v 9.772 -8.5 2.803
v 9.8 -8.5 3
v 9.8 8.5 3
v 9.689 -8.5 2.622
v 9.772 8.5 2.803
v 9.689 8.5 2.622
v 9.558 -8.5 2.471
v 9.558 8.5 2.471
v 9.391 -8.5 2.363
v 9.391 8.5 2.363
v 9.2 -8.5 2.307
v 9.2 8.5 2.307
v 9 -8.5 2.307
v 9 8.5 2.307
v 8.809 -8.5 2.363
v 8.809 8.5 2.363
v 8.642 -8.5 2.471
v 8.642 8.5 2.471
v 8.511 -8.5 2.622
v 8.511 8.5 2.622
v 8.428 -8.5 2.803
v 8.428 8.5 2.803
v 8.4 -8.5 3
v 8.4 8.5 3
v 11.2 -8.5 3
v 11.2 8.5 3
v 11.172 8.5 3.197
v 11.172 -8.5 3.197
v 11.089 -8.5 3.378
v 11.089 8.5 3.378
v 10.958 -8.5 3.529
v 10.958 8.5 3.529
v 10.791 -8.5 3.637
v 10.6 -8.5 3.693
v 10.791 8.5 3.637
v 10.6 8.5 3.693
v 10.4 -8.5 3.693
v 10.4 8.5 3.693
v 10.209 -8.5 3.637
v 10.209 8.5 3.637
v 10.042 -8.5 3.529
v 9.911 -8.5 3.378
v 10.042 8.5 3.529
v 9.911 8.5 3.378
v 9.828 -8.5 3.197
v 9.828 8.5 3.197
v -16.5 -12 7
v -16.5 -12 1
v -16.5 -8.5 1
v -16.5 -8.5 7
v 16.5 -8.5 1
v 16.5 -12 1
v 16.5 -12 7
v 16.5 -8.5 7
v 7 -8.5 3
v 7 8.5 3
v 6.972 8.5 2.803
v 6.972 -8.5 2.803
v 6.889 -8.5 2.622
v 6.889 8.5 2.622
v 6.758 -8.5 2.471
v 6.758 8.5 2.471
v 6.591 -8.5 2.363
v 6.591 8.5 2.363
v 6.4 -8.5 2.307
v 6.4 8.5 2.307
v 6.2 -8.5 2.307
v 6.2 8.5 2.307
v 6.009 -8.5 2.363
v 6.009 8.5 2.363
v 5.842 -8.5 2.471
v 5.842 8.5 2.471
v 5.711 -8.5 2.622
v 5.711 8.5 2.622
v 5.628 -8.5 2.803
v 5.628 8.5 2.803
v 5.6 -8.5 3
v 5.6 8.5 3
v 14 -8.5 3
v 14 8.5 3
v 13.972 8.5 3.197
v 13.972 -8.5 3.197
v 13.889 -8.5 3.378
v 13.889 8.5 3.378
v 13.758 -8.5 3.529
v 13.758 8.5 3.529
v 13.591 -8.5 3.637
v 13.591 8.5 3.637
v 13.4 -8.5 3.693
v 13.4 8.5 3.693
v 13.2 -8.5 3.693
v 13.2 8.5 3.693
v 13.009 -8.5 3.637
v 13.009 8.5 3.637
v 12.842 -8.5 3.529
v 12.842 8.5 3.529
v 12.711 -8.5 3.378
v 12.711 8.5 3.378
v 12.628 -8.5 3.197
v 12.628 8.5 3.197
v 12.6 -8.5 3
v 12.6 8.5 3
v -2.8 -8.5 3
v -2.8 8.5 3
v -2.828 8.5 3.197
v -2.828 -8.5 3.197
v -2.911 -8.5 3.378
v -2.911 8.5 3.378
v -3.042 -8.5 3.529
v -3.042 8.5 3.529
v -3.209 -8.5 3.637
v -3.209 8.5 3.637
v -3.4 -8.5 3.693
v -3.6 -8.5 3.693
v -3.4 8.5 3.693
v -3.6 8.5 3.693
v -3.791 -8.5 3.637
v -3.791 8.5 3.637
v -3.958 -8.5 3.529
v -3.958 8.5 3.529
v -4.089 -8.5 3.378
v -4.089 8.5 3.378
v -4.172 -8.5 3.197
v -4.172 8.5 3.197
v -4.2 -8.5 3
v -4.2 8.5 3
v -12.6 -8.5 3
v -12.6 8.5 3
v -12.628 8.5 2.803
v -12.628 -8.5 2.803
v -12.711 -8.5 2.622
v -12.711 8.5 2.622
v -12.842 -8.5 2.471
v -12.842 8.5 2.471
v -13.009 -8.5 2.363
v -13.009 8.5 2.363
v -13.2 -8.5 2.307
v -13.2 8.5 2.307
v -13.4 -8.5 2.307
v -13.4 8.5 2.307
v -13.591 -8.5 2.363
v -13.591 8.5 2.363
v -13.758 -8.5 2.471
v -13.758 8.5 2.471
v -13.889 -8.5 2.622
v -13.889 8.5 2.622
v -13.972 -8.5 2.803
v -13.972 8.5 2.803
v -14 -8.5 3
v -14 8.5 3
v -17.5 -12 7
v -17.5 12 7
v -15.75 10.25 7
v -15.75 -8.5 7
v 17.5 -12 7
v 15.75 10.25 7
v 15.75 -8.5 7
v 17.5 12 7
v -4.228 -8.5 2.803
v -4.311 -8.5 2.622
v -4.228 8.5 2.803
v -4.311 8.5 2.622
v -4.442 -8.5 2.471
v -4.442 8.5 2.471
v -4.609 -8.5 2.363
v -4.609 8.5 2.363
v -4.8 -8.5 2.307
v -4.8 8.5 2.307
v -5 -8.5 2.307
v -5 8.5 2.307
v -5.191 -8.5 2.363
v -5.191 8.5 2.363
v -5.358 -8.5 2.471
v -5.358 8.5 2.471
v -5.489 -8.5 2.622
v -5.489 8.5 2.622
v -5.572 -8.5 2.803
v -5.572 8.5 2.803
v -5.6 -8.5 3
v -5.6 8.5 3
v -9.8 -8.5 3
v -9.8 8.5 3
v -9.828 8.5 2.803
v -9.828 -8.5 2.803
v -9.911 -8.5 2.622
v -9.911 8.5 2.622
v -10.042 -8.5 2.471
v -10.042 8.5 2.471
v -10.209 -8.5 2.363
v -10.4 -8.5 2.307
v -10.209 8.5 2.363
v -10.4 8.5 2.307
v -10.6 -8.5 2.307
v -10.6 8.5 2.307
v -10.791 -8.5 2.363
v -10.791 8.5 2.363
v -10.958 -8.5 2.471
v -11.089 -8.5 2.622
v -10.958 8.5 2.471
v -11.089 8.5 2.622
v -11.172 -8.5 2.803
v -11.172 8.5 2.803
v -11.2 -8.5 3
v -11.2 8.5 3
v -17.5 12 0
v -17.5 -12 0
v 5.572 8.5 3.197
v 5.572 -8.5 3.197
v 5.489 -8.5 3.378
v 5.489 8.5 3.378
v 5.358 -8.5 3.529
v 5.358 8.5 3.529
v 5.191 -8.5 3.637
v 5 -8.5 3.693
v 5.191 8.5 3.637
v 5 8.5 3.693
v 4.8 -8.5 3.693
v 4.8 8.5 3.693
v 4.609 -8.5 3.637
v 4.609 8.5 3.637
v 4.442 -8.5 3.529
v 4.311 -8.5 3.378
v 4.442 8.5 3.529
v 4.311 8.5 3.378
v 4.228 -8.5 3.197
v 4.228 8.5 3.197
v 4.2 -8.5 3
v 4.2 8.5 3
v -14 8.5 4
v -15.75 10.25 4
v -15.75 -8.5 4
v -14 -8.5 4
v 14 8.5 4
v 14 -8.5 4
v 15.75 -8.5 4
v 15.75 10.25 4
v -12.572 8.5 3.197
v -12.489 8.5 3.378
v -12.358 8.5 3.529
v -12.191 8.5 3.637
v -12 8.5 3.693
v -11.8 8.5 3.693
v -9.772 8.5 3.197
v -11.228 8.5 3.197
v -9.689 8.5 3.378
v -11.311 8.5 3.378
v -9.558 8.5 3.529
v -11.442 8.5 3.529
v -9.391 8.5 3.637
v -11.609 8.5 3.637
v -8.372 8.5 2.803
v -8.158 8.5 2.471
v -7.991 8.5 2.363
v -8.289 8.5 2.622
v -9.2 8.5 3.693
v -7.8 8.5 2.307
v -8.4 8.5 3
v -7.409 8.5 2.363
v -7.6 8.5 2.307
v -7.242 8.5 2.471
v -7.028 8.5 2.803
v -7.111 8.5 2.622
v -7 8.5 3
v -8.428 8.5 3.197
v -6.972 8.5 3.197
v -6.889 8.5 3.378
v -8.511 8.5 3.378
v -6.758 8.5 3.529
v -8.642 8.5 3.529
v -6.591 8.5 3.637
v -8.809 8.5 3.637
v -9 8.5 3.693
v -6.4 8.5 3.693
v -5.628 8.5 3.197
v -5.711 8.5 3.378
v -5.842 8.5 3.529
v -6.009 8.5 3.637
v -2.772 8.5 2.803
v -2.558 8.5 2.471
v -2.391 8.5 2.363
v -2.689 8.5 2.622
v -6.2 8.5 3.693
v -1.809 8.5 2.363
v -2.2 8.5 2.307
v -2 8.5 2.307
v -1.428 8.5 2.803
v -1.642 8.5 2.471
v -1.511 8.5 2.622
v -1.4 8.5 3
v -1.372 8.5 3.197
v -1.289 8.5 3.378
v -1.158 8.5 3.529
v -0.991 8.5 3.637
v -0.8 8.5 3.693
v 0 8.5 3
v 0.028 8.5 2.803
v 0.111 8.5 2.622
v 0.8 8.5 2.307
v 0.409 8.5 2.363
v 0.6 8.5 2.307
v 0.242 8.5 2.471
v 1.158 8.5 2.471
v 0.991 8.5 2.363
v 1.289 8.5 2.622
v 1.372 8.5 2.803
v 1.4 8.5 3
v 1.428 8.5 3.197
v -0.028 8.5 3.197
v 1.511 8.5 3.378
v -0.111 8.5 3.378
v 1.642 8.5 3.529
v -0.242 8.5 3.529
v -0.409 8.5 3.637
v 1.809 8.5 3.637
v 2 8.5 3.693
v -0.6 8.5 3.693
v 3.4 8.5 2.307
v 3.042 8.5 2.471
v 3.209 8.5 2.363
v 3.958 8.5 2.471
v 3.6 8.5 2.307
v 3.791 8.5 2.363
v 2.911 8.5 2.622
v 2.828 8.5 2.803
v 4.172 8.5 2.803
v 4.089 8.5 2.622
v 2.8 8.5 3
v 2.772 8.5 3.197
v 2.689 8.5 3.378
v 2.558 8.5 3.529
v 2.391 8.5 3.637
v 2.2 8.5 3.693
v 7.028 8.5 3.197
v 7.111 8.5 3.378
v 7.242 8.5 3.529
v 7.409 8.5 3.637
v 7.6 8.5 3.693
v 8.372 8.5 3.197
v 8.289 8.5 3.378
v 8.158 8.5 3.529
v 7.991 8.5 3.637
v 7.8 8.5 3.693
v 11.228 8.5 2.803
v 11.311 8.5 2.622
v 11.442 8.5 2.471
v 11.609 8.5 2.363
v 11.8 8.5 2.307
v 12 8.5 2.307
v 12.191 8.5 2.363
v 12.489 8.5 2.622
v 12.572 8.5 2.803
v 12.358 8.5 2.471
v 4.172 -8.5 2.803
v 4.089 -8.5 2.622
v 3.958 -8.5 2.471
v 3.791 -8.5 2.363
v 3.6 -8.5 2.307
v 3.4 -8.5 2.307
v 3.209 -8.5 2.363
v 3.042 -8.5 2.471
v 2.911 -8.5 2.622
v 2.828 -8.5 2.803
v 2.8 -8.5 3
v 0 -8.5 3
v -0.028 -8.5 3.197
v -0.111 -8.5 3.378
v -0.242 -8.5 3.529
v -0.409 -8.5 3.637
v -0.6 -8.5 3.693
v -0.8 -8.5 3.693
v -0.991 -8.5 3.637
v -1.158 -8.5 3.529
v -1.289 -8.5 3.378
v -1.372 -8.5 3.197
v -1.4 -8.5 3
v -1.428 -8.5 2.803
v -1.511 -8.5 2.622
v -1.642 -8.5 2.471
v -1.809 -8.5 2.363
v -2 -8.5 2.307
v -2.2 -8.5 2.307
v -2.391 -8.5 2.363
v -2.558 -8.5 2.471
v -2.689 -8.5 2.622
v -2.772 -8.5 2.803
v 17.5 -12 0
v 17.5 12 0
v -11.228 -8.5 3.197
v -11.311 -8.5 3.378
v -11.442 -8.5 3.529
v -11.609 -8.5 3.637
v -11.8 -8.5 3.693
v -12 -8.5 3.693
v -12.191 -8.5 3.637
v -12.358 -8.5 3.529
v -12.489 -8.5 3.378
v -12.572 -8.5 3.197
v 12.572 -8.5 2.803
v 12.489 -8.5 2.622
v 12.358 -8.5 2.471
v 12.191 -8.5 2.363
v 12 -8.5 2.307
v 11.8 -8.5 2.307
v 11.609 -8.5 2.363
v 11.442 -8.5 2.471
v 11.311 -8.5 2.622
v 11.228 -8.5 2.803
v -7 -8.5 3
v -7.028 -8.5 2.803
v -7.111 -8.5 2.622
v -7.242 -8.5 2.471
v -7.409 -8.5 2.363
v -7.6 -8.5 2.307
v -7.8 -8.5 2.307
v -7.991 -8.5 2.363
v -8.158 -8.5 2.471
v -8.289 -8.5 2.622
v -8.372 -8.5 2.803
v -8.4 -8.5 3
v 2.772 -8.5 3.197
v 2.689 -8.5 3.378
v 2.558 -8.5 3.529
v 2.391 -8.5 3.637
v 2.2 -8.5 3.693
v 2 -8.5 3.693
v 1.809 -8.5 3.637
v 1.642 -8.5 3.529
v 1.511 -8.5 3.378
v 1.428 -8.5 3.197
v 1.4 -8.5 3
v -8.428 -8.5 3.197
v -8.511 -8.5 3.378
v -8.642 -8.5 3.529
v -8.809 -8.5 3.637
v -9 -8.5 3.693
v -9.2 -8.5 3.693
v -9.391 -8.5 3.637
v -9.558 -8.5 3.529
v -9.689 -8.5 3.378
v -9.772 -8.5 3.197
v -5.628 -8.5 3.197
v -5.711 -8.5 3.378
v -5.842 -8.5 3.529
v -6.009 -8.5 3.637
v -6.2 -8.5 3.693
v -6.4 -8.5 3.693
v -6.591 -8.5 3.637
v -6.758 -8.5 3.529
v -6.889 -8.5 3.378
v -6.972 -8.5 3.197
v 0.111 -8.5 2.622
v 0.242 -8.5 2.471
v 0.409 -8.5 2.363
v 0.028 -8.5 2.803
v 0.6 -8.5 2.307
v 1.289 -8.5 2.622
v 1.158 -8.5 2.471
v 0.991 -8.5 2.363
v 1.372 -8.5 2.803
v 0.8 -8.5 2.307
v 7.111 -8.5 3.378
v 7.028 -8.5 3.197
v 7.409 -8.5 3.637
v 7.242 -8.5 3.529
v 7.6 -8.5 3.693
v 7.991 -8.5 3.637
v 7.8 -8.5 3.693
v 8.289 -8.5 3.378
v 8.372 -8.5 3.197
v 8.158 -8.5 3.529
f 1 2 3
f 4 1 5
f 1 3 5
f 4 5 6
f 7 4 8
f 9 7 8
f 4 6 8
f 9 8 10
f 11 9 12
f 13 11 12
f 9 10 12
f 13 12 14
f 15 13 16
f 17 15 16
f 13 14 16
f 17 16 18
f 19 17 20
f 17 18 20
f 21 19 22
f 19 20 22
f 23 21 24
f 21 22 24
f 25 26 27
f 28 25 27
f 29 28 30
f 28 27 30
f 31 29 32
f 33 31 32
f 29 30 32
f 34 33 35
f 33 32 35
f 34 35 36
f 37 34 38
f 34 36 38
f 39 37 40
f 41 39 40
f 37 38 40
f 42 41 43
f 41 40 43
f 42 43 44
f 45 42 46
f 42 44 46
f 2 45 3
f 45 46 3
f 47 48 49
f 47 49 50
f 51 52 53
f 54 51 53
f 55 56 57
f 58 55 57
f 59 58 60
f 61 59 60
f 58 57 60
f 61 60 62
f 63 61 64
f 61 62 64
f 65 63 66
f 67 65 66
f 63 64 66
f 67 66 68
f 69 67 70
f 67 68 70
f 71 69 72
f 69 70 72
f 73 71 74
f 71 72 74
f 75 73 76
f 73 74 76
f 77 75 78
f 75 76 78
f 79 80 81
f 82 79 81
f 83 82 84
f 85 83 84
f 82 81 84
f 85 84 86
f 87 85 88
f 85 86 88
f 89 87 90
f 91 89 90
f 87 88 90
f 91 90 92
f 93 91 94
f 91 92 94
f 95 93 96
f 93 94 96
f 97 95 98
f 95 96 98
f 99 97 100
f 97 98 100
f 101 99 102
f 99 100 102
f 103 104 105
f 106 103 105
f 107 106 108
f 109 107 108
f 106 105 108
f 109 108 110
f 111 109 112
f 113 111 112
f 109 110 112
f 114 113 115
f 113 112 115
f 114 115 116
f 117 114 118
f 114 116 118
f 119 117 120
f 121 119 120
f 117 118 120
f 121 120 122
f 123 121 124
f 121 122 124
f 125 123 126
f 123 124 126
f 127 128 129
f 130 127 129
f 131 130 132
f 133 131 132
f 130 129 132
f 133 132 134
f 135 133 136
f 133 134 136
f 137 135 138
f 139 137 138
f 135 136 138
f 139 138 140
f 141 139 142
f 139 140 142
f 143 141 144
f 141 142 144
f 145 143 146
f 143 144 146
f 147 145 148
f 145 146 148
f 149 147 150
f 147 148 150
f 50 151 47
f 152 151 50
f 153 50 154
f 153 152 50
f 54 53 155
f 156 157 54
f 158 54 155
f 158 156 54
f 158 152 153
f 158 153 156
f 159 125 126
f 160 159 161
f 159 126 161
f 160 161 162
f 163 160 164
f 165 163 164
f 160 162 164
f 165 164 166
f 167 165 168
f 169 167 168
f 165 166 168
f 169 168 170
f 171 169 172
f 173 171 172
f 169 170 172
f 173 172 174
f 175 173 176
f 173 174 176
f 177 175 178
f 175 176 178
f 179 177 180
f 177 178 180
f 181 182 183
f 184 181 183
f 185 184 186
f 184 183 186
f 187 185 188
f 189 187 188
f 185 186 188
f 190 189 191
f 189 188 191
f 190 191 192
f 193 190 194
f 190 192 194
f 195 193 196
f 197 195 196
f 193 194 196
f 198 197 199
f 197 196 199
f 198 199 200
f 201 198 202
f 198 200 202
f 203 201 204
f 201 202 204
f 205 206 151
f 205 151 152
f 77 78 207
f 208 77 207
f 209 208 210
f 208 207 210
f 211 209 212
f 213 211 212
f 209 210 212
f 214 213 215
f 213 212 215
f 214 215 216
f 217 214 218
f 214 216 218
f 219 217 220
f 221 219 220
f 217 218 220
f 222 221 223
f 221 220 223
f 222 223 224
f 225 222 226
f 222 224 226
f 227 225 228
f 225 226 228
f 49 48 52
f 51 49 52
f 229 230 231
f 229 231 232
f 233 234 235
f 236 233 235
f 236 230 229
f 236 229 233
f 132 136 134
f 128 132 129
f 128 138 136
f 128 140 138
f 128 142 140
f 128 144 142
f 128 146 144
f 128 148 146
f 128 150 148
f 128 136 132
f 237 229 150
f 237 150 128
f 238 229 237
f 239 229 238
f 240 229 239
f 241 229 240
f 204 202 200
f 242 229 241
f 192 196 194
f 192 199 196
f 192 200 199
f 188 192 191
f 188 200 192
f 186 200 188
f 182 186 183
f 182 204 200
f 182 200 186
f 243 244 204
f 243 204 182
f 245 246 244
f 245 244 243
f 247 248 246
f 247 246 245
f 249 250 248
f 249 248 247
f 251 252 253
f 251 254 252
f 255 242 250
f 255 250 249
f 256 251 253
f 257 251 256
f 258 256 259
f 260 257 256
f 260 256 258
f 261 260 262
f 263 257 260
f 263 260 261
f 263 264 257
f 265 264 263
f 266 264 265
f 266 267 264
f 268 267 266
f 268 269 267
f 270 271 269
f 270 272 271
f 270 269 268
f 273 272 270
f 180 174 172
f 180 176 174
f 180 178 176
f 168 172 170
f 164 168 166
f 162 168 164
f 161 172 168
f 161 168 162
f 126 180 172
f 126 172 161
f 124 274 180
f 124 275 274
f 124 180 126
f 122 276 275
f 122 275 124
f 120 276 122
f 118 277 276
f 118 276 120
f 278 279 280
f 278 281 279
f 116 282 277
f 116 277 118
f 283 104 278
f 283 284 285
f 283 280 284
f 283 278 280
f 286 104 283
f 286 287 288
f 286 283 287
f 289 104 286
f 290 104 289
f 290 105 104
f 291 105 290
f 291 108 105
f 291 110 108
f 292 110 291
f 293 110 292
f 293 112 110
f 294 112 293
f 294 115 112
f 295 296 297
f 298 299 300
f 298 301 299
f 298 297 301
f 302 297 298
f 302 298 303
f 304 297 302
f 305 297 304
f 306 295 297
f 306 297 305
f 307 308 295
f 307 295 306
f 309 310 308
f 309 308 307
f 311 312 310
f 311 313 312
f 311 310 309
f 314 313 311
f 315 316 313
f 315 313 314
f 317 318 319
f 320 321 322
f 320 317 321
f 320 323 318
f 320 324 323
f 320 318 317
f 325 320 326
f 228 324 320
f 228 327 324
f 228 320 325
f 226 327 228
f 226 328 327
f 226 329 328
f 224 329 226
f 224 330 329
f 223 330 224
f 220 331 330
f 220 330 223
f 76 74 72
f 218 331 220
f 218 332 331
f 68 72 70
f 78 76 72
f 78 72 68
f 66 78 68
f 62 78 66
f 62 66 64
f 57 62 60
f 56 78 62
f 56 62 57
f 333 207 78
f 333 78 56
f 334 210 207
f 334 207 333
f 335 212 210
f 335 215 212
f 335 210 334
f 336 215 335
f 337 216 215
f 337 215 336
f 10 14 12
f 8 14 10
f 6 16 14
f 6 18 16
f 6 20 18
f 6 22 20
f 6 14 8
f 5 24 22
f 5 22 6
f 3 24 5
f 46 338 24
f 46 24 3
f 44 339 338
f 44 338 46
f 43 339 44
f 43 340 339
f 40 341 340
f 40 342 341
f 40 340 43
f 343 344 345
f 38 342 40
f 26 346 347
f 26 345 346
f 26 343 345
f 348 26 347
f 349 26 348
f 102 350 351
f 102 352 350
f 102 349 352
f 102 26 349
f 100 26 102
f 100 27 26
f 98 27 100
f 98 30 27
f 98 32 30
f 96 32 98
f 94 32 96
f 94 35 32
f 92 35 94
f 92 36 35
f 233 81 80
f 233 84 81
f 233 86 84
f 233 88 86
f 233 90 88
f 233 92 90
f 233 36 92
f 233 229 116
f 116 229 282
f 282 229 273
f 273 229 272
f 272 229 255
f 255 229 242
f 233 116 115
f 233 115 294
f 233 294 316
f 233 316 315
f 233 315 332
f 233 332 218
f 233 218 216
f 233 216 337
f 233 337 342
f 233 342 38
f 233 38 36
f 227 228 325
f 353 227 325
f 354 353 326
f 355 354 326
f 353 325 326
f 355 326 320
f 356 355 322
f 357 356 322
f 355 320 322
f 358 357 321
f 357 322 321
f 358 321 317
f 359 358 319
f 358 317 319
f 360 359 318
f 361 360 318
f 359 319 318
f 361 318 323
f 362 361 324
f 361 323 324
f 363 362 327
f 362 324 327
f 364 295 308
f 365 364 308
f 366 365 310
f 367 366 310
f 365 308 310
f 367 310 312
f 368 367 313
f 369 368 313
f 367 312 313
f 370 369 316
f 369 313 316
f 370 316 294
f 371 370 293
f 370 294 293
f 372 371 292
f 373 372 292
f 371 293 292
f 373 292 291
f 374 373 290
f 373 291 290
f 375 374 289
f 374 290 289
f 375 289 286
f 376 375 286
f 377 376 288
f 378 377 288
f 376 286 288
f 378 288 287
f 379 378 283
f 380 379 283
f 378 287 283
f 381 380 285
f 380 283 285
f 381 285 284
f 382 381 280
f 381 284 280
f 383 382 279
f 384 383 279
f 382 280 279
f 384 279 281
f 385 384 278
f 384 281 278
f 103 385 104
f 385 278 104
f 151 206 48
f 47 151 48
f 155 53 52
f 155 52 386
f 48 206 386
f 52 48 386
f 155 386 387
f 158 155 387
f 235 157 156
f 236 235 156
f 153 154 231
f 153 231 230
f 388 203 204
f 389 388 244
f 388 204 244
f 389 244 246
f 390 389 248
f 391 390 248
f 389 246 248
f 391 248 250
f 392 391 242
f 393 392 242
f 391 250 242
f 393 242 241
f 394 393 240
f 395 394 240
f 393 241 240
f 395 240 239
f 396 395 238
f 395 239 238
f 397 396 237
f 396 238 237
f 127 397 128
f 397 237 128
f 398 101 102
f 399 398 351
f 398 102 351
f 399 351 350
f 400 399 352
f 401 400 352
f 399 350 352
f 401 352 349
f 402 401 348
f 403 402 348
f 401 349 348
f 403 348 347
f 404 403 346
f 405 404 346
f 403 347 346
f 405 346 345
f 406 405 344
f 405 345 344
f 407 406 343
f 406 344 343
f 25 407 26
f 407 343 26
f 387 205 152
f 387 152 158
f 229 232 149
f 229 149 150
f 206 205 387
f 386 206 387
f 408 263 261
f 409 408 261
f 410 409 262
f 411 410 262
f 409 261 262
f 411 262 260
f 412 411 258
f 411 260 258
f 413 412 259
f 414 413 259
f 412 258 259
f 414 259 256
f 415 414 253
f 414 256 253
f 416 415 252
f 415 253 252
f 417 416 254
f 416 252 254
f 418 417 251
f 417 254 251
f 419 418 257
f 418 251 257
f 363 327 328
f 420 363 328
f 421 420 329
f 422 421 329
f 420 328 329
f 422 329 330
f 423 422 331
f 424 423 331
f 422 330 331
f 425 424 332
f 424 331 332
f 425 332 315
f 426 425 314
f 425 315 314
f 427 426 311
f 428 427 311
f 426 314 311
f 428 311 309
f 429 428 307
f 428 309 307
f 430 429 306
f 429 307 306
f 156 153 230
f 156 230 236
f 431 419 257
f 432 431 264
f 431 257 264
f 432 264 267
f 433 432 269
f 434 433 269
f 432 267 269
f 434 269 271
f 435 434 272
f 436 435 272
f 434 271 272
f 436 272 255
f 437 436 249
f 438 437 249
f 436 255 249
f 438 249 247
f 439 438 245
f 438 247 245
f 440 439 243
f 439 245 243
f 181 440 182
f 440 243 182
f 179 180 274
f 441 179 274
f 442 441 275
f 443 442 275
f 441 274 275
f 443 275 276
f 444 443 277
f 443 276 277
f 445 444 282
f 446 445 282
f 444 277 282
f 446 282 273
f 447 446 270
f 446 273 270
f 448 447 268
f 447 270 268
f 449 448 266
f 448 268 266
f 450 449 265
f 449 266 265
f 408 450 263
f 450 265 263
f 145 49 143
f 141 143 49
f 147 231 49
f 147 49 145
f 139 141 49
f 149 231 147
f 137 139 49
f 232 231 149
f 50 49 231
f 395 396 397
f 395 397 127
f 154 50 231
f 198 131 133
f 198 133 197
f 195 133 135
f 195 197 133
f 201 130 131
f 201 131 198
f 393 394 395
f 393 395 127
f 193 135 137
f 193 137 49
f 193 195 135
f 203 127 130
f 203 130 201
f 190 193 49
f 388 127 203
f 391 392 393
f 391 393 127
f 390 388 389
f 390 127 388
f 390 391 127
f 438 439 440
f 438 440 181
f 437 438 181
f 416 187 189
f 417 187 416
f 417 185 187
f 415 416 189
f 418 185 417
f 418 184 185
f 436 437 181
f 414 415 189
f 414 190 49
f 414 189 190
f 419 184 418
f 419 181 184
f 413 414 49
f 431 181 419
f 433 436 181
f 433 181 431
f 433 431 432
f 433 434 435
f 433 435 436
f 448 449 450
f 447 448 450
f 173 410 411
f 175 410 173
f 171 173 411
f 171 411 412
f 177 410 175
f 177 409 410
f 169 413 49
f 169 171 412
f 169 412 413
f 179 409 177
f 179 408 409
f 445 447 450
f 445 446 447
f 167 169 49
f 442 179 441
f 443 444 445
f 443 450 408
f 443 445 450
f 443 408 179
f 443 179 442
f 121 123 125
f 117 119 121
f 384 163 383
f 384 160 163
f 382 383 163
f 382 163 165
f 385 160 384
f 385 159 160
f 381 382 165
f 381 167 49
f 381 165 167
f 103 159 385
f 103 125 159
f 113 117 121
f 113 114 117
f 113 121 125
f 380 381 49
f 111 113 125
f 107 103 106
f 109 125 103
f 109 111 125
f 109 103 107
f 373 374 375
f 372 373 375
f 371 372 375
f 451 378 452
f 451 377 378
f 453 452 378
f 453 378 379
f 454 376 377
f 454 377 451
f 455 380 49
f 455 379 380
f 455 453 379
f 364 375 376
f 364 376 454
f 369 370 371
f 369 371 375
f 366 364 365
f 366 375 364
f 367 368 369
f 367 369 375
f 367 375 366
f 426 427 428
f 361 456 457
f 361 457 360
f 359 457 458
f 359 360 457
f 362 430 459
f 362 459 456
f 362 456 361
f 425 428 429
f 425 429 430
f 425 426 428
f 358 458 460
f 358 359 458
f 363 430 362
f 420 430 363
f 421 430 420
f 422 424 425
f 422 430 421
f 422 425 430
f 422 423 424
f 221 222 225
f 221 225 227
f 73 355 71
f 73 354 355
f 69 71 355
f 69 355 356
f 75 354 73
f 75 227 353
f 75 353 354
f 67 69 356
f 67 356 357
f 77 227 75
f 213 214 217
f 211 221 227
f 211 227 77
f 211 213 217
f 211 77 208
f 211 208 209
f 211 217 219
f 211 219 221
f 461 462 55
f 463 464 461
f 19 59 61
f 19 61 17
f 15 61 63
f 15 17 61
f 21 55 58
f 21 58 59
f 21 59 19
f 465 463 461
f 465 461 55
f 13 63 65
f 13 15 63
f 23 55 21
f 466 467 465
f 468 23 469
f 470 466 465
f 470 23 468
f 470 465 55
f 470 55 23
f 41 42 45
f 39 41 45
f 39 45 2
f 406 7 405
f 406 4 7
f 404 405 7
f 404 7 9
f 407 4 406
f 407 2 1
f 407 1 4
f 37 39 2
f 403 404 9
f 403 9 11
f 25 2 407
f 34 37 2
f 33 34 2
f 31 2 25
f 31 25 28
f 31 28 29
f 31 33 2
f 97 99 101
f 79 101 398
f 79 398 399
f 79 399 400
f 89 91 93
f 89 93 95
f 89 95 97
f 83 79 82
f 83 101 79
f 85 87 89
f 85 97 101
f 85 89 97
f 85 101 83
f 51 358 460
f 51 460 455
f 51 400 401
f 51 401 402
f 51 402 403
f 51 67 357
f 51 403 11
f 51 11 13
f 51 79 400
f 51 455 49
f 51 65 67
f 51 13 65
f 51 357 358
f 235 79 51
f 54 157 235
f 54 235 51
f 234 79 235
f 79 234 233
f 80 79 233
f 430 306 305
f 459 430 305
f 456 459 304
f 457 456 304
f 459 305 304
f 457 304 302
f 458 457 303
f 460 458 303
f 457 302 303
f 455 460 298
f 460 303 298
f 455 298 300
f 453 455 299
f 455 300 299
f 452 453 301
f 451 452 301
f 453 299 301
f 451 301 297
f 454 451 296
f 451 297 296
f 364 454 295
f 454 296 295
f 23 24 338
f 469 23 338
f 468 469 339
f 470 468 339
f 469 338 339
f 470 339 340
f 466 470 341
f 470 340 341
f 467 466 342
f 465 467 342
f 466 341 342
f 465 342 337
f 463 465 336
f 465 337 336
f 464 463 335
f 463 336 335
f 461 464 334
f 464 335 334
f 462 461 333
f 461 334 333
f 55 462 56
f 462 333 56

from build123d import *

# Parameters (mm, degrees)
SKETCH_1_W          = 35
SKETCH_1_H          = 24
EXTRUDE_1_DEPTH     = 7
SKETCH_2_W          = 31.5
SKETCH_2_H          = 20.5
CUT_EXTRUDE_1_DEPTH = 3
SKETCH_3_W          = 28
SKETCH_3_H          = 17
CUT_EXTRUDE_2_DEPTH = 2
EXTRUDE_2_DEPTH     = 17
SKETCH_6_W          = 33
SKETCH_6_H          = 6
CUT_EXTRUDE_3_DEPTH = 3.5


with BuildPart() as part:
    # 草图1 → 凸台-拉伸1 (new body)
    with BuildSketch(Plane.XY):
        Rectangle(SKETCH_1_W, SKETCH_1_H)
    extrude(amount=EXTRUDE_1_DEPTH)

    # 草图2 → 切除-拉伸1 (cut)
    with BuildSketch(Plane.XY.offset(7)):
        Rectangle(SKETCH_2_W, SKETCH_2_H)
    extrude(amount=-CUT_EXTRUDE_1_DEPTH, mode=Mode.SUBTRACT)

    # 草图3 → 切除-拉伸2 (cut)
    with BuildSketch(Plane.XY.offset(4)):
        Rectangle(SKETCH_3_W, SKETCH_3_H)
    extrude(amount=-CUT_EXTRUDE_2_DEPTH, mode=Mode.SUBTRACT)

    # 草图4 → 凸台-拉伸2 (add)
    with BuildSketch(Plane.XZ.offset(-8.5)):
        with BuildLine():
            Line((-15, 3), (-15, 1))
            Line((-15, 1), (15, 1))
            Line((15, 1), (15, 3))
            Line((15, 3), (14, 3))
            ThreePointArc((14, 3), (13.3, 3.7), (12.6, 3))
            ThreePointArc((12.6, 3), (11.9, 2.3), (11.2, 3))
            ThreePointArc((11.2, 3), (10.5, 3.7), (9.8, 3))
            ThreePointArc((9.8, 3), (9.1, 2.3), (8.4, 3))
            ThreePointArc((8.4, 3), (7.7, 3.7), (7, 3))
            ThreePointArc((7, 3), (6.3, 2.3), (5.6, 3))
            ThreePointArc((5.6, 3), (4.9, 3.7), (4.2, 3))
            ThreePointArc((4.2, 3), (3.5, 2.3), (2.8, 3))
            ThreePointArc((2.8, 3), (2.1, 3.7), (1.4, 3))
            ThreePointArc((1.4, 3), (0.7, 2.3), (0, 3))
            ThreePointArc((0, 3), (-0.7, 3.7), (-1.4, 3))
            ThreePointArc((-1.4, 3), (-2.1, 2.3), (-2.8, 3))
            ThreePointArc((-2.8, 3), (-3.5, 3.7), (-4.2, 3))
            ThreePointArc((-4.2, 3), (-4.9, 2.3), (-5.6, 3))
            ThreePointArc((-5.6, 3), (-6.3, 3.7), (-7, 3))
            ThreePointArc((-7, 3), (-7.7, 2.3), (-8.4, 3))
            ThreePointArc((-8.4, 3), (-9.1, 3.7), (-9.8, 3))
            ThreePointArc((-9.8, 3), (-10.5, 2.3), (-11.2, 3))
            ThreePointArc((-11.2, 3), (-11.9, 3.7), (-12.6, 3))
            ThreePointArc((-12.6, 3), (-13.3, 2.3), (-14, 3))
            Line((-14, 3), (-15, 3))
        make_face()
    extrude(amount=EXTRUDE_2_DEPTH)

    # 草图6 → 切除-拉伸3 (cut)
    with BuildSketch(Plane.XZ.offset(12)):
        with Locations((0, 4)):
            Rectangle(SKETCH_6_W, SKETCH_6_H)
    extrude(amount=-CUT_EXTRUDE_3_DEPTH, mode=Mode.SUBTRACT)


solid = part.part
